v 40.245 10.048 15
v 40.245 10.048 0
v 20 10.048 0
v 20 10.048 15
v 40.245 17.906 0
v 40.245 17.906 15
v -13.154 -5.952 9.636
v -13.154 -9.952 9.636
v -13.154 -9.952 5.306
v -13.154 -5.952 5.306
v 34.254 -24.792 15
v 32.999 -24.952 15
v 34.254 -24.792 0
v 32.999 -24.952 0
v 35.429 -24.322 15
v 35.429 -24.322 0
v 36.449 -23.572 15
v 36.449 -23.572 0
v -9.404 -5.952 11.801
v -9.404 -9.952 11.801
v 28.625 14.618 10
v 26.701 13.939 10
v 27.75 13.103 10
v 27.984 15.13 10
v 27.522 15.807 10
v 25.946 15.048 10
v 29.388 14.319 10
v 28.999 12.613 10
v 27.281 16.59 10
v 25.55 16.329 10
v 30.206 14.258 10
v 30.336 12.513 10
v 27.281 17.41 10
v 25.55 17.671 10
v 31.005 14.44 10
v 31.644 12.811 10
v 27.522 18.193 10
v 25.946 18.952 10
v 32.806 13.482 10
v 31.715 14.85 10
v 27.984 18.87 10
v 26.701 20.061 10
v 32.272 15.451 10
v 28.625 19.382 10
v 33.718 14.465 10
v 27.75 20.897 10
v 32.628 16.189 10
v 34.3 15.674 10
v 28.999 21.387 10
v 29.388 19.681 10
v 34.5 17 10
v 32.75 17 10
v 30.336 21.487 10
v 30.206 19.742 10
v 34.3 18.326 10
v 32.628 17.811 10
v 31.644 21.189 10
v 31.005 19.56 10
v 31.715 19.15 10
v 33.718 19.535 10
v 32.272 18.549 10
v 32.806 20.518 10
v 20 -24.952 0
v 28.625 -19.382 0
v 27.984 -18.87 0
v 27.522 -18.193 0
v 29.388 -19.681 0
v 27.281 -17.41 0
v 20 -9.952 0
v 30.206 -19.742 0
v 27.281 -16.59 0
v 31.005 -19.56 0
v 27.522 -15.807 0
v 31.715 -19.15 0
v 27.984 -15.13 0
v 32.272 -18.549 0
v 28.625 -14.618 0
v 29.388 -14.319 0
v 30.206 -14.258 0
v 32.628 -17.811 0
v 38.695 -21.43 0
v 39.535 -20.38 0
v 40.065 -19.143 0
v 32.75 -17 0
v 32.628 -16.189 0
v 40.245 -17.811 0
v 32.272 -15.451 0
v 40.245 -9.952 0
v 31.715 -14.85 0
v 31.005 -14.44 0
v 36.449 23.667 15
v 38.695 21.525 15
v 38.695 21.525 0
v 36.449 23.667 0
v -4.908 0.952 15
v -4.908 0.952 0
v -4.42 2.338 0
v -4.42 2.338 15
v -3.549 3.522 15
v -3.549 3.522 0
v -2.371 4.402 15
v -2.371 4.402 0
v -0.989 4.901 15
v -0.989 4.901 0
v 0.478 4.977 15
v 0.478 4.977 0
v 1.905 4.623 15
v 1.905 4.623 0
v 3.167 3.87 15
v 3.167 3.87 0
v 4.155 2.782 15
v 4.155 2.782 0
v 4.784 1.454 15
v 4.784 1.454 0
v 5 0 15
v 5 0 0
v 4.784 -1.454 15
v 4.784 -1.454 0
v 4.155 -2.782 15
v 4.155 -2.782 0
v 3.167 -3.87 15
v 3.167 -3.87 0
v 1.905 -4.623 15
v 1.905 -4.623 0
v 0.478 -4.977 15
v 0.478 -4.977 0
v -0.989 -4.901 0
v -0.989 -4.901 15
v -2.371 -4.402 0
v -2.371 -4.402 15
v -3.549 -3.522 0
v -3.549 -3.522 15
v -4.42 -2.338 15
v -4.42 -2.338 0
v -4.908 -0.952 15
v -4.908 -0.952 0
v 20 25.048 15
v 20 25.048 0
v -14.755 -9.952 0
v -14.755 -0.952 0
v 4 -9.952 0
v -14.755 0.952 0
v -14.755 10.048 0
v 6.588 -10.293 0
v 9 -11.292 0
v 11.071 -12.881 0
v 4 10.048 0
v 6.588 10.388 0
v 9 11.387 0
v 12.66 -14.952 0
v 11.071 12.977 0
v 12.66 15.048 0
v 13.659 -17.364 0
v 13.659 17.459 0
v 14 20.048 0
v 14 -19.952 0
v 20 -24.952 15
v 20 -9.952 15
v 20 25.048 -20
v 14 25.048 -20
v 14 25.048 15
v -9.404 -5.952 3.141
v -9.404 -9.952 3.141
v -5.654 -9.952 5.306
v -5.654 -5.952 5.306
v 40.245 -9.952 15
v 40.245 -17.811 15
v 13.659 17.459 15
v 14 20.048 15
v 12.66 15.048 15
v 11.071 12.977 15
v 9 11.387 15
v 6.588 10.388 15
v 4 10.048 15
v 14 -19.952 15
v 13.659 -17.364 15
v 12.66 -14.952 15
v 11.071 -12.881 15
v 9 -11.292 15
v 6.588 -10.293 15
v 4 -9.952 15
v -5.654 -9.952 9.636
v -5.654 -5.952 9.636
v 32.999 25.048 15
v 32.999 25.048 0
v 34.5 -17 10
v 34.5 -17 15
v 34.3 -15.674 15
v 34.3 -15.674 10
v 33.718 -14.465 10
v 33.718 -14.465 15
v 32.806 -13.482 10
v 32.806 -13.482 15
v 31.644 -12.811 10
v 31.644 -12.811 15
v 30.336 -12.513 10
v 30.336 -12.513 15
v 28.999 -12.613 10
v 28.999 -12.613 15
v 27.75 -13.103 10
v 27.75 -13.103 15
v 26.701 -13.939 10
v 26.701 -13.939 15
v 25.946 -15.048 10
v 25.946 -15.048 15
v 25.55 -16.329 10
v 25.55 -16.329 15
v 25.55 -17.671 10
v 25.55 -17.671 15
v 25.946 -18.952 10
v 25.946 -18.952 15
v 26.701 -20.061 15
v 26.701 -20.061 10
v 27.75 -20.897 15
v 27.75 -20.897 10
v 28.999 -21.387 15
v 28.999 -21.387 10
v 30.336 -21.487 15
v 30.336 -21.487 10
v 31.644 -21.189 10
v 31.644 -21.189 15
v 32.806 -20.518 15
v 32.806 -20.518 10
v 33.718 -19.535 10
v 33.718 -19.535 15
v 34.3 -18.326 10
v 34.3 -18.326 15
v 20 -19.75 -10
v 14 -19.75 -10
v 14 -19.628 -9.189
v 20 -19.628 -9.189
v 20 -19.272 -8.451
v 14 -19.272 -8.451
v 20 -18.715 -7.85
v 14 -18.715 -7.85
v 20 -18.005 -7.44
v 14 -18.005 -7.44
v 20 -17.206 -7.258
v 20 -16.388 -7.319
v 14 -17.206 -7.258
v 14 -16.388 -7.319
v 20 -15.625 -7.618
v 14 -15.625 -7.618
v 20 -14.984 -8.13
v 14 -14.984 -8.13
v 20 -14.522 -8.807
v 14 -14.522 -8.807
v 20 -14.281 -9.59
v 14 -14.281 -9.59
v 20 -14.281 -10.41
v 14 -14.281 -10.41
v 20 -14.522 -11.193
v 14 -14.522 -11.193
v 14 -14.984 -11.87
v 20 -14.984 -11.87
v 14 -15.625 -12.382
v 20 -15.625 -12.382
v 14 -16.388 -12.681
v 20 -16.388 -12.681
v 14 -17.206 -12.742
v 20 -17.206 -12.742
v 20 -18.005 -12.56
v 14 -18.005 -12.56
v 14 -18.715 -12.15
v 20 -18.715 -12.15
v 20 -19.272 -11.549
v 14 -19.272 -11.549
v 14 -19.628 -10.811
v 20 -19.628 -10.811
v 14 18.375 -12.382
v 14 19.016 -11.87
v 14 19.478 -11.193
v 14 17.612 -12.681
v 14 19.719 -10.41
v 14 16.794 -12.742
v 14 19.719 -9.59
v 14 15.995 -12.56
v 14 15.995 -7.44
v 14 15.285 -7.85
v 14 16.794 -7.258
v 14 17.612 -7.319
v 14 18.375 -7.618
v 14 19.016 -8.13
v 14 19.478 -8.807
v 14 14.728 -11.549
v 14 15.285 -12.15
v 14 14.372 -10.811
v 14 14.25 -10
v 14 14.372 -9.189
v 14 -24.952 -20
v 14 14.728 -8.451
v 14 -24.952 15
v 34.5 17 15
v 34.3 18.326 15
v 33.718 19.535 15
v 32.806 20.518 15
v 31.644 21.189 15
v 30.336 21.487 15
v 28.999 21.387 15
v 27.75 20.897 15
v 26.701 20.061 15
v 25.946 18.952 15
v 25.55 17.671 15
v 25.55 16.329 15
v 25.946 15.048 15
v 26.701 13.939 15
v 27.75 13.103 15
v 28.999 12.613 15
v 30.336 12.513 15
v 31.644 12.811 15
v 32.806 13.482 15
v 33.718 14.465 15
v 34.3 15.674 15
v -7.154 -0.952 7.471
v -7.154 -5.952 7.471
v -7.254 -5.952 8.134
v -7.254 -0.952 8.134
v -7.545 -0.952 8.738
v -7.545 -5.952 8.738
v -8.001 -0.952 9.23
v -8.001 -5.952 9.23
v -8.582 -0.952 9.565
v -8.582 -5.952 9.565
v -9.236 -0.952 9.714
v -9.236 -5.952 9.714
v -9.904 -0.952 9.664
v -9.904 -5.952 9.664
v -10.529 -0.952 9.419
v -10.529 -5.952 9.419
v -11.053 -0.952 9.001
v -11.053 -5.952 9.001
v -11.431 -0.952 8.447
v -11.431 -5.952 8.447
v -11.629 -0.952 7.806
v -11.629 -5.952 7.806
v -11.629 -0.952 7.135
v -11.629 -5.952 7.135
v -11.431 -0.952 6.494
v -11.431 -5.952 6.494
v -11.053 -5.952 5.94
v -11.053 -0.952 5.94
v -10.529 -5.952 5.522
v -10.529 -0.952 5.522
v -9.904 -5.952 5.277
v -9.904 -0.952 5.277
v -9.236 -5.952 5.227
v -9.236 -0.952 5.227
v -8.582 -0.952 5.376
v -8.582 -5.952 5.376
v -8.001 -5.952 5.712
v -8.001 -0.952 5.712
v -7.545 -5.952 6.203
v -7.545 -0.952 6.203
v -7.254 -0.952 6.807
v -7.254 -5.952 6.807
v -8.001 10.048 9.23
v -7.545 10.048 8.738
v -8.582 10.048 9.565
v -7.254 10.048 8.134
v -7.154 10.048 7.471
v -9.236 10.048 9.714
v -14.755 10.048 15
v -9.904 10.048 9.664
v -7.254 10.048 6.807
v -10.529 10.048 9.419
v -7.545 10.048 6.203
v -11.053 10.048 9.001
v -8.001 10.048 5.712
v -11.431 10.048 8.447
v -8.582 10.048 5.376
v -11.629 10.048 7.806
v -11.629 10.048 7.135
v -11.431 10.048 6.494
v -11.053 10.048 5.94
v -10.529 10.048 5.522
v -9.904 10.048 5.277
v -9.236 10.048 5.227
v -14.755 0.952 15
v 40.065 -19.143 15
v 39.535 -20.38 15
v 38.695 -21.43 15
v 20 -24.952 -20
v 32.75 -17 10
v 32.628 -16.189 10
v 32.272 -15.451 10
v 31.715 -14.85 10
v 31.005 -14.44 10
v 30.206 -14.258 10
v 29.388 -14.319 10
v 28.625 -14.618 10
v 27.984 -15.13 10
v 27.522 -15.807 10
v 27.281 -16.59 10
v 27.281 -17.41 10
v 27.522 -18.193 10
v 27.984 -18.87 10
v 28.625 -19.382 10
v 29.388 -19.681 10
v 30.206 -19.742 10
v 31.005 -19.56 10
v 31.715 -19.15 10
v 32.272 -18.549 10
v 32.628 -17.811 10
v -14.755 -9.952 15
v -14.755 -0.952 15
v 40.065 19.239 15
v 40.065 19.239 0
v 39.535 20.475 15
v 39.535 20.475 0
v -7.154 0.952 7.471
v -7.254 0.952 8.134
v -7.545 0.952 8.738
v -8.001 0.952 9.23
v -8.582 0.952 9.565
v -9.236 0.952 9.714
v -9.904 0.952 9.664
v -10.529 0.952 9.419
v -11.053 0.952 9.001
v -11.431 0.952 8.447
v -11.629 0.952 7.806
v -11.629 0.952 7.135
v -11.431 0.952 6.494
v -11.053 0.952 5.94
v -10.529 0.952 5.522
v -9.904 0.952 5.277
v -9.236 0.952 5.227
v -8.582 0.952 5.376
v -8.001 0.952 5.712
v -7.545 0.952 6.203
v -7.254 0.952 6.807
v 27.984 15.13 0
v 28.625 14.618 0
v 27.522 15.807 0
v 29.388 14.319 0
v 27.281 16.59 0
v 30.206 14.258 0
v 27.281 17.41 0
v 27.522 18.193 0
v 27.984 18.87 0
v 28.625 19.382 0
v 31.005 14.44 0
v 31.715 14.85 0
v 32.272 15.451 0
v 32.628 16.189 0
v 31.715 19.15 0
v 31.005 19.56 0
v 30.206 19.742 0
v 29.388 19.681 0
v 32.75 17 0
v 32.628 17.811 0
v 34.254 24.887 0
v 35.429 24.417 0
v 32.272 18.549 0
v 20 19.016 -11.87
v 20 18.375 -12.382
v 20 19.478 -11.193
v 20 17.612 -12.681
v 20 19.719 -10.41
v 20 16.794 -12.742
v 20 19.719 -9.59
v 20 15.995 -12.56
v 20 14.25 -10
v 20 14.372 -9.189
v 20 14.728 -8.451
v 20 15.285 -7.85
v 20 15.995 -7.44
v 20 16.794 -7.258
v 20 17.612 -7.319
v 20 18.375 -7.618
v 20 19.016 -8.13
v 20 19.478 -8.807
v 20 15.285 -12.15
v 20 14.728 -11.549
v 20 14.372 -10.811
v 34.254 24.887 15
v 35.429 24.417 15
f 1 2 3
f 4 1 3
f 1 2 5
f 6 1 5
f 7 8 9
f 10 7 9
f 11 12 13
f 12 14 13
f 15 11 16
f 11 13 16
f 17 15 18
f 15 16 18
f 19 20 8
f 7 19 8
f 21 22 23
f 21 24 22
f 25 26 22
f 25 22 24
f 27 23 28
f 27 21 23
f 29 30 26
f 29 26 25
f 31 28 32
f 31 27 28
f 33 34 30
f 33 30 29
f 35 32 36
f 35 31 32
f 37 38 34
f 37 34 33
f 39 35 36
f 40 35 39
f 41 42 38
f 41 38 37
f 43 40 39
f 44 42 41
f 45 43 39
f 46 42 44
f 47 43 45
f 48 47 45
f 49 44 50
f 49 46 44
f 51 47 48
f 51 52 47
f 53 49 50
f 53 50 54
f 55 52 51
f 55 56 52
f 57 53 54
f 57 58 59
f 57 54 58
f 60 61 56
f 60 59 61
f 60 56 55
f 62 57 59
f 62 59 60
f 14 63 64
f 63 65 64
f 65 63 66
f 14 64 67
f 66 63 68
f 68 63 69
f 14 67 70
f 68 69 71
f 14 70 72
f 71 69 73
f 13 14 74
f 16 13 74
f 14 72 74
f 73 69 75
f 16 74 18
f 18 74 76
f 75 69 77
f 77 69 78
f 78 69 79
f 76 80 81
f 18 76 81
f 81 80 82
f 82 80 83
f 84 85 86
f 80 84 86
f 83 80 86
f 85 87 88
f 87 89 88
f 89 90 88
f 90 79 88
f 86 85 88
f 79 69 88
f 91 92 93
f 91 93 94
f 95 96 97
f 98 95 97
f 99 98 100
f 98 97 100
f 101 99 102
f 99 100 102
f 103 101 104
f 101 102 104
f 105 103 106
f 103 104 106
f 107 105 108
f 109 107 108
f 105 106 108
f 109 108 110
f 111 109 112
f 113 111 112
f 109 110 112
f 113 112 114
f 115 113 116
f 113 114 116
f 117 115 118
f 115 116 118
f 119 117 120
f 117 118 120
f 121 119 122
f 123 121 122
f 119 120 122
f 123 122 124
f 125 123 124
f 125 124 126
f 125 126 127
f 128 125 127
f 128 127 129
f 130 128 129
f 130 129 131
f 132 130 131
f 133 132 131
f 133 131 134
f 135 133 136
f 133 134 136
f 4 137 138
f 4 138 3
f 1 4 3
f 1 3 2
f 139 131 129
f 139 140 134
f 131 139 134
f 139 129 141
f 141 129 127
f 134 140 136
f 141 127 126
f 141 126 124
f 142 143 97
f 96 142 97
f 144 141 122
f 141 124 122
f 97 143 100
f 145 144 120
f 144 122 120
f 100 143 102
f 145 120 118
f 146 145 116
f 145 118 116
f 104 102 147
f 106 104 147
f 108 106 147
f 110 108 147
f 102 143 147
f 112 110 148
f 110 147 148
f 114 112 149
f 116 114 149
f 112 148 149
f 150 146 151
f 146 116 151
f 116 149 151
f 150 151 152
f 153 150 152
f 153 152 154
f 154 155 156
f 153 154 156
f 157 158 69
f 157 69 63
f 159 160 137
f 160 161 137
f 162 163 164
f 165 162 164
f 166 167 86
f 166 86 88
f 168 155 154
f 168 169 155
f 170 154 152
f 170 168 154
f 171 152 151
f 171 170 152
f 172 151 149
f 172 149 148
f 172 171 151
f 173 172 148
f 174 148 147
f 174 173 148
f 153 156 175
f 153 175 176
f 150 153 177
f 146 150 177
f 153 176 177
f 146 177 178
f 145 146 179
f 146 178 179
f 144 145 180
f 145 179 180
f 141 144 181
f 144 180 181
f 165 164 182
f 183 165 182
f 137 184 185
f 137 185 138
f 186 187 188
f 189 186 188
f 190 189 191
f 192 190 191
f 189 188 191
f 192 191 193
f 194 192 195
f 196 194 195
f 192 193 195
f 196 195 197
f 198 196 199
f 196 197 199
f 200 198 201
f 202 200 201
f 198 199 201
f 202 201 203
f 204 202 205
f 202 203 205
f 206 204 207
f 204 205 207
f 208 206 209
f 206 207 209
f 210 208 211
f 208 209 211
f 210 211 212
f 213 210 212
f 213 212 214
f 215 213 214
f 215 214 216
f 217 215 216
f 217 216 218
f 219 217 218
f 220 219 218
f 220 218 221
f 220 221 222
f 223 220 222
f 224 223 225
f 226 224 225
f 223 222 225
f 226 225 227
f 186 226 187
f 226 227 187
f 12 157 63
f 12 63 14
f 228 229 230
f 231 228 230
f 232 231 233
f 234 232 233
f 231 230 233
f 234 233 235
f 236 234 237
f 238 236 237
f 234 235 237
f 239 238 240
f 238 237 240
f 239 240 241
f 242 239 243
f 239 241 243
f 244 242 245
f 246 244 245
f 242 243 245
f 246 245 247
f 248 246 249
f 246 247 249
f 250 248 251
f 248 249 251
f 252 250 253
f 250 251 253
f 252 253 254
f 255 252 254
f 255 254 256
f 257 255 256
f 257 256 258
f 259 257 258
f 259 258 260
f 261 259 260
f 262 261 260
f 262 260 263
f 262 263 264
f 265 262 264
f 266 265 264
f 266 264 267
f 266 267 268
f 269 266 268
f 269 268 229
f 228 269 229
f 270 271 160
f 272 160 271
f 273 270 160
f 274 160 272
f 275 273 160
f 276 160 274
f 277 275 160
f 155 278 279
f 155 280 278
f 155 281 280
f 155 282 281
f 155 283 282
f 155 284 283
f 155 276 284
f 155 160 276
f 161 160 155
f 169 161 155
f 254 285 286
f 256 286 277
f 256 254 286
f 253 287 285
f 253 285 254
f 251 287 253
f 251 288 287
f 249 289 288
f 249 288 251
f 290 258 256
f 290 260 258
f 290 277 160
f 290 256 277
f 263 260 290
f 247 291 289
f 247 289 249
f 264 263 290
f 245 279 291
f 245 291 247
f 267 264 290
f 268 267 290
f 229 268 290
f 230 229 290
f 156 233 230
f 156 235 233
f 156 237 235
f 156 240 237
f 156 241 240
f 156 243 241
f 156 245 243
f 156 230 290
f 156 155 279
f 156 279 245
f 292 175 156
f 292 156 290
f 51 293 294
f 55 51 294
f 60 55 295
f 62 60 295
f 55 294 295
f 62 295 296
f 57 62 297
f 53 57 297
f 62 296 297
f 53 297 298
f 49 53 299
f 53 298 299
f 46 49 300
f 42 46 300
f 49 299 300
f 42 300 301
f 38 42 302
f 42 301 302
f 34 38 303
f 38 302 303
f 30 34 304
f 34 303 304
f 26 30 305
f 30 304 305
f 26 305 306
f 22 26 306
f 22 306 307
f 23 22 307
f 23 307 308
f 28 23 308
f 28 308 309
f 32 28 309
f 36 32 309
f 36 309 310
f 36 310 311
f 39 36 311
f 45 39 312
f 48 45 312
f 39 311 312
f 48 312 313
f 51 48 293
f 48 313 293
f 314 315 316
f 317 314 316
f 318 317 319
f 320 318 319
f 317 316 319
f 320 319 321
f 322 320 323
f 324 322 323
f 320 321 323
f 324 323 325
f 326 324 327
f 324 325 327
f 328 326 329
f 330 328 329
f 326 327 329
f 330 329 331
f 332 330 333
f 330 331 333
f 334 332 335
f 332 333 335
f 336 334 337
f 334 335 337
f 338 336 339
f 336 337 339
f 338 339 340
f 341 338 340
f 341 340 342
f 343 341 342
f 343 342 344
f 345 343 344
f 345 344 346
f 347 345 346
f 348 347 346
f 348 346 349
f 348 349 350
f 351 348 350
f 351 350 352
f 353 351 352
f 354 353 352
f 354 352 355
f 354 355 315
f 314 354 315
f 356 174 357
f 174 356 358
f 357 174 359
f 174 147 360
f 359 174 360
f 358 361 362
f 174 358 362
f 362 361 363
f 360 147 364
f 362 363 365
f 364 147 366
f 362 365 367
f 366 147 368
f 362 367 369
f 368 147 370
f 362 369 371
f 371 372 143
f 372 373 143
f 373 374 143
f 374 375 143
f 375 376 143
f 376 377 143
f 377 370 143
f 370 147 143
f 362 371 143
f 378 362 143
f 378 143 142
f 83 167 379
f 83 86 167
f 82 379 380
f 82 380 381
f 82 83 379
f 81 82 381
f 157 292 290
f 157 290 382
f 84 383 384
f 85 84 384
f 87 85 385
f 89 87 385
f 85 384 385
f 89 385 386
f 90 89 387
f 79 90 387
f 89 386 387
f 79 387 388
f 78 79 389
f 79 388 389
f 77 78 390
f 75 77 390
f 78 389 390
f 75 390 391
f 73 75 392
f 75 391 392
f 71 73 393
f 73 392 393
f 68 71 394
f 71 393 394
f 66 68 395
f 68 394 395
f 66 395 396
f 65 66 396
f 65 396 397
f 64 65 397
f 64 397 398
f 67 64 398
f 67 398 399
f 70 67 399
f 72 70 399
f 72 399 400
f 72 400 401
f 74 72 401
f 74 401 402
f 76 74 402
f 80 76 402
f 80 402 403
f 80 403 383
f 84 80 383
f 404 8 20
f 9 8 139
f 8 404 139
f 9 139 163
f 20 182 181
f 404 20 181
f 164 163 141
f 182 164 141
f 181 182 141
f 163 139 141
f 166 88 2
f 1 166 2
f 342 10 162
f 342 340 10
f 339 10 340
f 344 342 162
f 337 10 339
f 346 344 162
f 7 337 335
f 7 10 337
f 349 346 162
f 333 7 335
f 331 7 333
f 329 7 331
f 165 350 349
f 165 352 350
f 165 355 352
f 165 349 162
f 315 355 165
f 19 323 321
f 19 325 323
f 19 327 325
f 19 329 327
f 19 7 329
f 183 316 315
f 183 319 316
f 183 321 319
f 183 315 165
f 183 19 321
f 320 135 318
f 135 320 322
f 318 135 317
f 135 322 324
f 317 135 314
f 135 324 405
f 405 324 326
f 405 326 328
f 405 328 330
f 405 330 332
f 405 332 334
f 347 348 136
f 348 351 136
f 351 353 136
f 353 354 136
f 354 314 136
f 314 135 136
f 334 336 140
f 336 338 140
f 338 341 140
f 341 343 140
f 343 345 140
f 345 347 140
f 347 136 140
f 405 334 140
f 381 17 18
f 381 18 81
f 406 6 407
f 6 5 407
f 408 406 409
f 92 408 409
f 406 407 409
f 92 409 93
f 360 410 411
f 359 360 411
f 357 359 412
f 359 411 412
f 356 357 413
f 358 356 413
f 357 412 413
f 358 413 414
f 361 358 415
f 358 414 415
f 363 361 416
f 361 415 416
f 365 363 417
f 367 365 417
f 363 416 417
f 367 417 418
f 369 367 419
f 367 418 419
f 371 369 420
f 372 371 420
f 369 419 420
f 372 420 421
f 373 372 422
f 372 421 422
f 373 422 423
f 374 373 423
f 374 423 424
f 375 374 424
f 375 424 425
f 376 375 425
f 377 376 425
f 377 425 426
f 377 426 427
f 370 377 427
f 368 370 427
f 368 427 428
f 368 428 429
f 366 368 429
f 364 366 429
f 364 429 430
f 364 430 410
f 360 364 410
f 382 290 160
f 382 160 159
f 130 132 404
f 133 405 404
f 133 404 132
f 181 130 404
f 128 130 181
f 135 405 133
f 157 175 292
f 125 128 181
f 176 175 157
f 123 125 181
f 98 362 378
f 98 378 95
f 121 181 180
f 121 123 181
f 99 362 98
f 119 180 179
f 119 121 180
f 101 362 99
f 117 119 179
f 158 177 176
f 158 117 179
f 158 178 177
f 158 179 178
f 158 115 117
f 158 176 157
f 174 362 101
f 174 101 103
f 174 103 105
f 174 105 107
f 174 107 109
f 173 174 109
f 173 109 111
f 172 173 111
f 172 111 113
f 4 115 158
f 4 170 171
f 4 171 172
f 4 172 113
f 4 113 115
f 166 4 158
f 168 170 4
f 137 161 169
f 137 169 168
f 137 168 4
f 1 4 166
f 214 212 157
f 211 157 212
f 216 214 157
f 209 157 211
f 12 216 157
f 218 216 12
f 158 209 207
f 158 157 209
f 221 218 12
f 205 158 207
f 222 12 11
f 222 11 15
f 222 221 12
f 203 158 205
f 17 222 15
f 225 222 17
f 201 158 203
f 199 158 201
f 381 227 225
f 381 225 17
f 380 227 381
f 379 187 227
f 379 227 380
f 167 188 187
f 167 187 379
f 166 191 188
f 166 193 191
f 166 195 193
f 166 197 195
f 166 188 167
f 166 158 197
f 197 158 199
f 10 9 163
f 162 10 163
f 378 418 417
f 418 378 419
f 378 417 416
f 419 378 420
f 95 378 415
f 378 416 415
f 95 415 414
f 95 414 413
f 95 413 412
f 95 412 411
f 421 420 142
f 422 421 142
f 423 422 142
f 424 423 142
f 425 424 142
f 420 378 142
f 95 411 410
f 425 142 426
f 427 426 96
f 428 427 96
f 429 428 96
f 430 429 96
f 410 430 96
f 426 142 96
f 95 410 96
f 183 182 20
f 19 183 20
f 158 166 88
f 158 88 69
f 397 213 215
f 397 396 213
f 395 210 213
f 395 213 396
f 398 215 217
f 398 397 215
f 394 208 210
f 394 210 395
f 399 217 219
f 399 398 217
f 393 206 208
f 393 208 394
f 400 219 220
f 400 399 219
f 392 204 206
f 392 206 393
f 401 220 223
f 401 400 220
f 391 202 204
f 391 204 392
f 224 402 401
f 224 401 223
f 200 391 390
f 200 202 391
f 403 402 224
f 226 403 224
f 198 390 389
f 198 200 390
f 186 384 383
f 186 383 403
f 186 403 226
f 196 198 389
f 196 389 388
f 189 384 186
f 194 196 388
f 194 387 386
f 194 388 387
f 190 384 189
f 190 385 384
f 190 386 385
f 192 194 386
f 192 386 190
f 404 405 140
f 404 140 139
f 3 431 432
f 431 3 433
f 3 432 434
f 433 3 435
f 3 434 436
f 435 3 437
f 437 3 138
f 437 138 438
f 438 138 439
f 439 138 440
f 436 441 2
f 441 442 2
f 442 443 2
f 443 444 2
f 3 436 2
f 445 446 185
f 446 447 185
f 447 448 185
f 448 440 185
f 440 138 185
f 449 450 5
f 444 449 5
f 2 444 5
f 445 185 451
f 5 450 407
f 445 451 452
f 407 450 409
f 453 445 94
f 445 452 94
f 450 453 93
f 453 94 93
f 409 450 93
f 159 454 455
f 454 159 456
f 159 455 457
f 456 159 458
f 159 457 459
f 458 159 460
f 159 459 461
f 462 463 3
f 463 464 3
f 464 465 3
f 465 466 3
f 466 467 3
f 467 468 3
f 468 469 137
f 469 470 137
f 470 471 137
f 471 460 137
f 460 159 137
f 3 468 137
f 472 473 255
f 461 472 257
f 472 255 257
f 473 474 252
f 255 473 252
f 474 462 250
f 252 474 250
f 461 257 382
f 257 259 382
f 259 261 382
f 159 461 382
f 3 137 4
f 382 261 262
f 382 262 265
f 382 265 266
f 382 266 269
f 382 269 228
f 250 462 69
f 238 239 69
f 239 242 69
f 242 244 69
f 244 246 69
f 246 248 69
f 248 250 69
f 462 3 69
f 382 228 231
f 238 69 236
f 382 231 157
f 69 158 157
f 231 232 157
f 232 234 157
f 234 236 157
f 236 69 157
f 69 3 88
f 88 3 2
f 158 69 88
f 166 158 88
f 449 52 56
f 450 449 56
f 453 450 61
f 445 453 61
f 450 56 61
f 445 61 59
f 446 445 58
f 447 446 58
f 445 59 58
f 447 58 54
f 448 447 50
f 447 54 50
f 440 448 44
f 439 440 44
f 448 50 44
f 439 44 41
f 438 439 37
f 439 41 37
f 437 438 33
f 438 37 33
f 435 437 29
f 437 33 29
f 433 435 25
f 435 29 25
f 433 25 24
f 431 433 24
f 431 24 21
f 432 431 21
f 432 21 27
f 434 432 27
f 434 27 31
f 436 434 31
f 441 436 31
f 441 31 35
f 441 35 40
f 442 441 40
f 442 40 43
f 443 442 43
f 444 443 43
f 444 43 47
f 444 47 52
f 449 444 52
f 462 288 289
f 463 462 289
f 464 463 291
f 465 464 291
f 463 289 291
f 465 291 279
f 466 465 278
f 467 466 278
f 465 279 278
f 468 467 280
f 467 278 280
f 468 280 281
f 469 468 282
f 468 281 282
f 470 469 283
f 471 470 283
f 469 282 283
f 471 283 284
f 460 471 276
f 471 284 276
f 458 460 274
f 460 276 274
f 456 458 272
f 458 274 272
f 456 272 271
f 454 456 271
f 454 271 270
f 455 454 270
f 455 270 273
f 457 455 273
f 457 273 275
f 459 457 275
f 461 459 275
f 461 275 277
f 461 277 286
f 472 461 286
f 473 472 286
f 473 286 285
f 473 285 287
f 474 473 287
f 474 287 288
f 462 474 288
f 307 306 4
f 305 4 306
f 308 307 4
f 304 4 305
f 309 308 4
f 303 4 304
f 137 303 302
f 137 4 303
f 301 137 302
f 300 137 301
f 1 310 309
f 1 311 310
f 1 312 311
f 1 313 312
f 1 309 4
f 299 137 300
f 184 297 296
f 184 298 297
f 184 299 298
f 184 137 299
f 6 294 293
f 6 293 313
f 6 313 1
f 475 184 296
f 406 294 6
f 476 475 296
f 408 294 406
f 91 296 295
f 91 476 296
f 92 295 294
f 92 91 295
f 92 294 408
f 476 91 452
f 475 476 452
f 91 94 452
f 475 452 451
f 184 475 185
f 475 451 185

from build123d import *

# Parameters (mm, degrees)
F1_DEPTH  = 15
F2_W      = 6
F2_H      = 15
F3_DEPTH  = 15
F4_W      = 6
F4_H      = 15
F5_DEPTH  = 15
F6_W      = 6
F6_H      = 50
F7_DEPTH  = 20
F8_R      = 2.75
F9_DEPTH  = 10
F11_DEPTH = 15
F12_R     = 10
F13_R     = 5
F13_2_R   = 5
F14_R     = 2.25
F15_DEPTH = 25
F16_R     = 2.75
F17_DEPTH = 20
F16_R_2   = 4.5
F18_DEPTH = 5
F19_R     = 2.75
F20_DEPTH = 20
F19_R_2   = 4.5
F21_DEPTH = 5
F22_DEPTH = 4


with BuildPart() as f1:
    # F0 (on Top) → F1 (new body)
    with BuildSketch(Plane.XY):
        with BuildLine():
            ThreePointArc((-4.9084590781, 0.9523809524), (5, 0), (-4.9084590781, -0.9523809524))
            Line((-4.9084590781, -0.9523809524), (-14.7545770461, -0.9523809524))
            Line((-14.7545770461, -0.9523809524), (-14.7545770461, -9.9523809524))
            Line((-14.7545770461, -9.9523809524), (40.2454229539, -9.9523809524))
            Line((40.2454229539, -9.9523809524), (40.2454229539, 10.0476190476))
            Line((40.2454229539, 10.0476190476), (-14.7545770461, 10.0476190476))
            Line((-14.7545770461, 10.0476190476), (-14.7545770461, 0.9523809524))
            Line((-14.7545770461, 0.9523809524), (-4.9084590781, 0.9523809524))
        make_face()
    extrude(amount=F1_DEPTH)

    # F2 (on face) → F3 (join)
    with BuildSketch(Plane.XZ.offset(9.9523809524)):
        with Locations((17, 7.5)):
            Rectangle(F2_W, F2_H)
    extrude(amount=F3_DEPTH)

    # F4 (on face) → F5 (join)
    with BuildSketch(Plane(origin=(0, 10.0476190476, 0), x_dir=(-1, 0, 0), z_dir=(0, 1, 0))):
        with Locations((-17, 7.5)):
            Rectangle(F4_W, F4_H)
    extrude(amount=F5_DEPTH)

    # F6 (on face) → F7 (join)
    with BuildSketch(Plane(origin=(0, 0, 0), x_dir=(1, 0, 0), z_dir=(0, 0, -1))):
        with Locations((17, -0.0476190476)):
            Rectangle(F6_W, F6_H)
    extrude(amount=F7_DEPTH)

    # F8 (on face) → F9 (cut)
    with BuildSketch(Plane(origin=(14, 0, 0), x_dir=(0, -1, 0), z_dir=(-1, 0, 0))):
        with Locations((-17, -10)):
            Circle(F8_R)
        with Locations((17, -10)):
            Circle(F8_R)
    extrude(amount=-F9_DEPTH, mode=Mode.SUBTRACT)

    # F12
    f12_edges = [f1.edges().sort_by_distance(p)[0] for p in [
        (14, -9.952381, 7.5),
        (14, 10.047619, 7.5),
    ]]
    fillet(f12_edges, radius=F12_R)

    # F14 (on face) → F15 (cut)
    with BuildSketch(Plane.XZ.offset(9.9523809524)):
        with Locations((-9.4037707895, 7.4706980959)):
            Circle(F14_R)
    extrude(amount=-F15_DEPTH, mode=Mode.SUBTRACT)

    # F14 (on face) → F22 (cut)
    with BuildSketch(Plane.XZ.offset(9.9523809524)):
        Polygon((-5.6537707895, 5.3056345864), (-5.6537707895, 9.6357616053), (-9.4037707895, 11.8008251148), (-13.1537707895, 9.6357616053), (-13.1537707895, 5.3056345864), (-9.4037707895, 3.1405710769), align=None)
        with Locations((-9.4037707895, 7.4706980959)):
            Circle(F14_R, mode=Mode.SUBTRACT)
    extrude(amount=-F22_DEPTH, mode=Mode.SUBTRACT)


with BuildPart() as f11:
    # F10 (on face) → F11 (new body)
    with BuildSketch(Plane.XY.offset(15)):
        Polygon((20, 25.0476190476), (20, 10.0476190476), (40.2454229539, 10.0476190476), (40.2454229539, 20.0476190476), (35, 25.0476190476), align=None)
    extrude(amount=-F11_DEPTH)

    # F13#2
    f13_2_edges = [f11.edges().sort_by_distance(p)[0] for p in [
        (40.245423, 20.047619, 7.5),
        (35, 25.047619, 7.5),
    ]]
    fillet(f13_2_edges, radius=F13_2_R)

    # F16 (on face) → F17 (cut)
    with BuildSketch(Plane.XY.offset(15)):
        with Locations((30, 17)):
            Circle(F16_R)
    extrude(amount=-F17_DEPTH, mode=Mode.SUBTRACT)

    # F16 (on face) → F18 (cut)
    with BuildSketch(Plane.XY.offset(15)):
        with Locations((30, 17)):
            Circle(F16_R_2)
        with Locations((30, 17)):
            Circle(F16_R, mode=Mode.SUBTRACT)
    extrude(amount=-F18_DEPTH, mode=Mode.SUBTRACT)


with BuildPart() as f11b:
    # F10 (on face) → F11, piece 2 (new body)
    with BuildSketch(Plane.XY.offset(15)):
        Polygon((40.2454229539, -19.9523809524), (40.2454229539, -9.9523809524), (20, -9.9523809524), (20, -24.9523809524), (35, -24.9523809524), align=None)
    extrude(amount=-F11_DEPTH)

    # F13
    f13_edges = [f11b.edges().sort_by_distance(p)[0] for p in [
        (35, -24.952381, 7.5),
        (40.245423, -19.952381, 7.5),
    ]]
    fillet(f13_edges, radius=F13_R)

    # F19 (on face) → F20 (cut)
    with BuildSketch(Plane.XY.offset(15)):
        with Locations((30, -17)):
            Circle(F19_R)
    extrude(amount=-F20_DEPTH, mode=Mode.SUBTRACT)

    # F19 (on face) → F21 (cut)
    with BuildSketch(Plane.XY.offset(15)):
        with Locations((30, -17)):
            Circle(F19_R_2)
        with Locations((30, -17)):
            Circle(F19_R, mode=Mode.SUBTRACT)
    extrude(amount=-F21_DEPTH, mode=Mode.SUBTRACT)


solid = Compound([f1.part, f11.part, f11b.part])
